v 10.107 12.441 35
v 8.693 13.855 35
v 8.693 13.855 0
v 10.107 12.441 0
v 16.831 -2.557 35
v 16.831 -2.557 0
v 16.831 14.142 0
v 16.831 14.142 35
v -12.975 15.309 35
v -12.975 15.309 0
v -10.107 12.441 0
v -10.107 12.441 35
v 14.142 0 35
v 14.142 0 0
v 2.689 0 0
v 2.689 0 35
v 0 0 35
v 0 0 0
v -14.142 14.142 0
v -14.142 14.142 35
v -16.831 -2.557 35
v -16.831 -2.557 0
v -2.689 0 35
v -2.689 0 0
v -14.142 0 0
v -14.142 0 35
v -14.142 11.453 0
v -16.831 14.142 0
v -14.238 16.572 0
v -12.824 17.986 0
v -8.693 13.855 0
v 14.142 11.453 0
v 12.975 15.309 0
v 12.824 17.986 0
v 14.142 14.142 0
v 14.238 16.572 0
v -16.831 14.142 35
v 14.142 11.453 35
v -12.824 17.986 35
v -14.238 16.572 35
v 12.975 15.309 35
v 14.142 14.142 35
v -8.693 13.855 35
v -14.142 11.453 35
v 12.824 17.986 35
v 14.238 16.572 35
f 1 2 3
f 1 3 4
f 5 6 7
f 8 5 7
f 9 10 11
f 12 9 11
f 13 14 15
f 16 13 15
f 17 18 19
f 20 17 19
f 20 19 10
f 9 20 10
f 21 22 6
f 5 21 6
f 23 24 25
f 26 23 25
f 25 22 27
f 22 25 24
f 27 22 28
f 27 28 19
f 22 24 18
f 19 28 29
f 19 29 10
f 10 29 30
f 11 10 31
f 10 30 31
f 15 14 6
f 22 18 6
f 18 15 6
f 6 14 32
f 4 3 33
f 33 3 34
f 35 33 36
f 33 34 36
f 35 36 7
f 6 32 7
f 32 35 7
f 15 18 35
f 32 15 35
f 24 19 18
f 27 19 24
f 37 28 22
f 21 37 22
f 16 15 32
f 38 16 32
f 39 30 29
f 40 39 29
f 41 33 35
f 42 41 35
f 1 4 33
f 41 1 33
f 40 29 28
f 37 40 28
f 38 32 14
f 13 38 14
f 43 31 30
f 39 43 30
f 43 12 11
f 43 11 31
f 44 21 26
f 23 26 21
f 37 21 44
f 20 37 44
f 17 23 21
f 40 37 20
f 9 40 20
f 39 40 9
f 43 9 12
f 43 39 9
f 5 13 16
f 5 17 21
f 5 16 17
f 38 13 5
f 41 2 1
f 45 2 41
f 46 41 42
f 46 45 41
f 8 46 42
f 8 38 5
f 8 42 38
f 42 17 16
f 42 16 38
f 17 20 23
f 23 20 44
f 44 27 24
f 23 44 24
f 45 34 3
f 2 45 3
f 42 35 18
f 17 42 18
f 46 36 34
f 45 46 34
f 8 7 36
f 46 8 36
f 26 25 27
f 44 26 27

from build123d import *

# Parameters (mm, degrees)
F2_DEPTH = 35


with BuildPart() as f2:
    # F1 (on Top) + F0 (on Top) → F2 (new body)
    with BuildSketch(Plane.XY):
        Polygon((-16.83088, -2.557084), (0, -2.557084), (0, 0), (-14.142136, 14.142136), (-12.975409, 15.308862), (-10.107344, 12.440796), (-8.69313, 13.85501), (-12.823902, 17.985781), (-14.238115, 16.571568), (-16.83088, 14.142136), align=None)
        Polygon((-14.142136, 11.453391), (-2.688745, 0), (-14.142136, 0), align=None, mode=Mode.SUBTRACT)
    with BuildSketch(Plane.XY):
        Polygon((14.142136, 14.142136), (0, 0), (0, -2.557084), (16.83088, -2.557084), (16.83088, 14.142136), (14.238115, 16.571568), (12.823902, 17.985781), (8.69313, 13.85501), (10.107344, 12.440796), (12.975409, 15.308862), align=None)
        Polygon((2.688745, 0), (14.142136, 11.453391), (14.142136, 0), align=None, mode=Mode.SUBTRACT)
    extrude(amount=F2_DEPTH)


solid = f2.part
